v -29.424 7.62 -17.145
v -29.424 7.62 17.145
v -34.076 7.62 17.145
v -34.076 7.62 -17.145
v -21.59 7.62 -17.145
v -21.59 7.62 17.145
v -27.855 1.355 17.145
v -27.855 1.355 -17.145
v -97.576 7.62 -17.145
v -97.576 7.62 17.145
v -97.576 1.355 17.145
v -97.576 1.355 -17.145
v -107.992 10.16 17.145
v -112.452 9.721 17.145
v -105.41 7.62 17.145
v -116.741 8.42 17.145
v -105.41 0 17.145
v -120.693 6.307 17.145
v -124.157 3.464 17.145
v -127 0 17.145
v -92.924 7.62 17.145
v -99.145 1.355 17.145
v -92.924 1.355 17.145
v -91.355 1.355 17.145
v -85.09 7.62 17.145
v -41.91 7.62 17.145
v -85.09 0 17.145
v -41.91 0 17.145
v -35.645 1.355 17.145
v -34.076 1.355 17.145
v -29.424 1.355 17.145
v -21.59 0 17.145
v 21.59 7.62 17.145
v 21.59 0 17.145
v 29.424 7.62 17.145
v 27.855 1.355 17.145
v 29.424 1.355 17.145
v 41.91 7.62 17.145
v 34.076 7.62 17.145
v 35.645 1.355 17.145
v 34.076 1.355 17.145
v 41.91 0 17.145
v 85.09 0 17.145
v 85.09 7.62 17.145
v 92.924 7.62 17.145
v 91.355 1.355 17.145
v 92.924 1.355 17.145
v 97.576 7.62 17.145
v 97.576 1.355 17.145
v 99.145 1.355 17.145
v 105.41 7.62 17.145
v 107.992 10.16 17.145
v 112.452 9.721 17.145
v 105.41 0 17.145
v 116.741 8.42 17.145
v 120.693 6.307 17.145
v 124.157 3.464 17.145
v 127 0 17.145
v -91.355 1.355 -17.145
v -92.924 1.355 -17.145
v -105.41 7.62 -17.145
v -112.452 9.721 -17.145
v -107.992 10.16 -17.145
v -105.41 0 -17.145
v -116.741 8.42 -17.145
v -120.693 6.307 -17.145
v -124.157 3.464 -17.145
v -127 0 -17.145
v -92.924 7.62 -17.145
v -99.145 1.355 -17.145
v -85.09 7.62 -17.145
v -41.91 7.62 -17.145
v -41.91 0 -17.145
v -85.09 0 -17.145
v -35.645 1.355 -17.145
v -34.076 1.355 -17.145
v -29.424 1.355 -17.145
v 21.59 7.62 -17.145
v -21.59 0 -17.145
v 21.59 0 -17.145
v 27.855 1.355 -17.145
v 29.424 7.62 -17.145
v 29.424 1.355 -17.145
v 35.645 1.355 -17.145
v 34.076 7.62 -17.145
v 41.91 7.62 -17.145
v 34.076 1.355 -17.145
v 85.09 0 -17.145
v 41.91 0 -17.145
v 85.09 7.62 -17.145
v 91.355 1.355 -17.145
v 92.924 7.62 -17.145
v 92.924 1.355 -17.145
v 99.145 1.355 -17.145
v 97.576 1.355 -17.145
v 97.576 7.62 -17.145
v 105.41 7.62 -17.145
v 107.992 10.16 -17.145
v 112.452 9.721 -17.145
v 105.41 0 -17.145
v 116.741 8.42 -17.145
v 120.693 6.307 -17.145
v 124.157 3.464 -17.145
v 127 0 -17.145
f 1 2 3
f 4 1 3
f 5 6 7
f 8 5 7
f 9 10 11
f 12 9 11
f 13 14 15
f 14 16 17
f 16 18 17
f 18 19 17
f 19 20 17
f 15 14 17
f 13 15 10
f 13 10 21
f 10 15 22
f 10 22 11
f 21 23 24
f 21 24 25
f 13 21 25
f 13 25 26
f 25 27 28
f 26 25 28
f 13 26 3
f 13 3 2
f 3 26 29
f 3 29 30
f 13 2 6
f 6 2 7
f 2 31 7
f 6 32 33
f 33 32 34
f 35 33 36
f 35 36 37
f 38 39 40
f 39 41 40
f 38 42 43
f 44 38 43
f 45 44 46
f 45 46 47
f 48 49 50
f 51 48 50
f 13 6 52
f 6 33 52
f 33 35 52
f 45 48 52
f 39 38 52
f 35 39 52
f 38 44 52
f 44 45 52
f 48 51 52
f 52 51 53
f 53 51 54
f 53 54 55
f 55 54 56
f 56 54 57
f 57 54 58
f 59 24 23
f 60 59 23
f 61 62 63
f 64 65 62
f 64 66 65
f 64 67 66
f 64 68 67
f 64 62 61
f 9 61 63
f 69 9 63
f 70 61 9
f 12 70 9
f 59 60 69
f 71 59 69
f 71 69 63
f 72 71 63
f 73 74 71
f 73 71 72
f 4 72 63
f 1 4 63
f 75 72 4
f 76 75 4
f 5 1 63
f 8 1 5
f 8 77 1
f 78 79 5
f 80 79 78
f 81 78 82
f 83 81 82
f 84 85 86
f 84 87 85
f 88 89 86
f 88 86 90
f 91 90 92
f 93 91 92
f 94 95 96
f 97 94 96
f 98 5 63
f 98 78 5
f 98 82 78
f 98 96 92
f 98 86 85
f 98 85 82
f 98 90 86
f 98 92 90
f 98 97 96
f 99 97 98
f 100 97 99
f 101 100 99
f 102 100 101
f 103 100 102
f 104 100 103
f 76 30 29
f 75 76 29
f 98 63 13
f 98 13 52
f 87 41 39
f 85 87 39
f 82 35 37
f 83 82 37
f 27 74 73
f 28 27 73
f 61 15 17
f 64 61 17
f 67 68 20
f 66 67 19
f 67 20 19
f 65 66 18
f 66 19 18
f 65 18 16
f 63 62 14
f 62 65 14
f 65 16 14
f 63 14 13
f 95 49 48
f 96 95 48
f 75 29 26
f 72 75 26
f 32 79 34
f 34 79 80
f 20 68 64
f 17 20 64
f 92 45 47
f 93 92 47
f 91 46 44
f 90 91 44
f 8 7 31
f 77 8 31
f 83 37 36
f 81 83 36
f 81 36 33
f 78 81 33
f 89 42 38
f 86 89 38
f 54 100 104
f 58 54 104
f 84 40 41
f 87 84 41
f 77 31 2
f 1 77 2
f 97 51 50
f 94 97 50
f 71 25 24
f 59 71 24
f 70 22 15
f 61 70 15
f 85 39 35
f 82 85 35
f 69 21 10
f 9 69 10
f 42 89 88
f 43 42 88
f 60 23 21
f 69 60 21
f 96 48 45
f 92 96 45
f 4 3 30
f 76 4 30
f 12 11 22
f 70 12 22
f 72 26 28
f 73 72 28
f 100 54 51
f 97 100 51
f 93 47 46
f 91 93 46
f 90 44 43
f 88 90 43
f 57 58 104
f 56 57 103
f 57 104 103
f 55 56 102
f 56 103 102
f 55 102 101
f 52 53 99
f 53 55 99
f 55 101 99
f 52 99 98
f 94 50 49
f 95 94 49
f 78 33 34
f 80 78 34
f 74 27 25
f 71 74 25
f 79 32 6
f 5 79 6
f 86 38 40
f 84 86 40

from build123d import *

# Parameters (mm, degrees)
SKETCH1_W           = 254
SKETCH1_H           = 34.29
BOSS_EXTRUDE1_DEPTH = 10.16
FILLET1_R           = 22.86
CUT_EXTRUDE2_DEPTH  = 50.8
LPATTERN1_COUNT     = 4
LPATTERN1_PITCH     = 63.5


with BuildPart() as part:
    # Sketch1 → Boss-Extrude1 (new body)
    with BuildSketch(Plane(origin=(0, 0, 0), x_dir=(1, 0, 0), z_dir=(0, 1, 0))):
        Rectangle(SKETCH1_W, SKETCH1_H)
    extrude(amount=BOSS_EXTRUDE1_DEPTH)

    # Fillet1
    # the kernel refuses this fillet: 22.86 mm, written as the material it takes off along each edge
    with BuildSketch(Plane(origin=(-127, 10.16, 64.664048812), x_dir=(0, -1, 0), z_dir=(0, 0, -1)), Plane(origin=(127, 10.16, -64.664048812), x_dir=(0, -1, 0), z_dir=(0, 0, 1))) as fillet1_piece_1:
        with BuildLine():
            CenterArc((22.86, -19.007619525), FILLET1_R, 123.748988596, 56.251011404)
            Line((0, -19.007619525), (-0.4572, -19.007619525))
            Line((-0.4572, -19.007619525), (-0.4572, 0))
            Line((-0.4572, 0), (0, 0.4572))
            ThreePointArc((0, 0.4572), (5.08, 0.4572), (9.906, 0.38015239))
            Line((9.906, 0.38015239), (10.16, 0))
        make_face()
    extrude(amount=129.328097624, mode=Mode.SUBTRACT)

    # Sketch2 → Cut-Extrude2 (cut)
    with BuildSketch(Plane.XY.offset(17.145)):
        Polygon((-85.09, 0), (-85.09, 7.62), (-91.35478418, 1.35521582), (-92.92396906, 1.35521582), (-92.92396906, 7.62), (-97.57603094, 7.62), (-97.57603094, 1.35521582), (-99.14521582, 1.35521582), (-105.41, 7.62), (-105.41, 0), align=None)
    cut_extrude2 = extrude(amount=-CUT_EXTRUDE2_DEPTH, mode=Mode.SUBTRACT)

    # LPattern1: Cut-Extrude2 ×4
    with Locations(*[(i * LPATTERN1_PITCH, 0, 0) for i in range(1, LPATTERN1_COUNT)]):
        add(cut_extrude2, mode=Mode.SUBTRACT)


solid = part.part
